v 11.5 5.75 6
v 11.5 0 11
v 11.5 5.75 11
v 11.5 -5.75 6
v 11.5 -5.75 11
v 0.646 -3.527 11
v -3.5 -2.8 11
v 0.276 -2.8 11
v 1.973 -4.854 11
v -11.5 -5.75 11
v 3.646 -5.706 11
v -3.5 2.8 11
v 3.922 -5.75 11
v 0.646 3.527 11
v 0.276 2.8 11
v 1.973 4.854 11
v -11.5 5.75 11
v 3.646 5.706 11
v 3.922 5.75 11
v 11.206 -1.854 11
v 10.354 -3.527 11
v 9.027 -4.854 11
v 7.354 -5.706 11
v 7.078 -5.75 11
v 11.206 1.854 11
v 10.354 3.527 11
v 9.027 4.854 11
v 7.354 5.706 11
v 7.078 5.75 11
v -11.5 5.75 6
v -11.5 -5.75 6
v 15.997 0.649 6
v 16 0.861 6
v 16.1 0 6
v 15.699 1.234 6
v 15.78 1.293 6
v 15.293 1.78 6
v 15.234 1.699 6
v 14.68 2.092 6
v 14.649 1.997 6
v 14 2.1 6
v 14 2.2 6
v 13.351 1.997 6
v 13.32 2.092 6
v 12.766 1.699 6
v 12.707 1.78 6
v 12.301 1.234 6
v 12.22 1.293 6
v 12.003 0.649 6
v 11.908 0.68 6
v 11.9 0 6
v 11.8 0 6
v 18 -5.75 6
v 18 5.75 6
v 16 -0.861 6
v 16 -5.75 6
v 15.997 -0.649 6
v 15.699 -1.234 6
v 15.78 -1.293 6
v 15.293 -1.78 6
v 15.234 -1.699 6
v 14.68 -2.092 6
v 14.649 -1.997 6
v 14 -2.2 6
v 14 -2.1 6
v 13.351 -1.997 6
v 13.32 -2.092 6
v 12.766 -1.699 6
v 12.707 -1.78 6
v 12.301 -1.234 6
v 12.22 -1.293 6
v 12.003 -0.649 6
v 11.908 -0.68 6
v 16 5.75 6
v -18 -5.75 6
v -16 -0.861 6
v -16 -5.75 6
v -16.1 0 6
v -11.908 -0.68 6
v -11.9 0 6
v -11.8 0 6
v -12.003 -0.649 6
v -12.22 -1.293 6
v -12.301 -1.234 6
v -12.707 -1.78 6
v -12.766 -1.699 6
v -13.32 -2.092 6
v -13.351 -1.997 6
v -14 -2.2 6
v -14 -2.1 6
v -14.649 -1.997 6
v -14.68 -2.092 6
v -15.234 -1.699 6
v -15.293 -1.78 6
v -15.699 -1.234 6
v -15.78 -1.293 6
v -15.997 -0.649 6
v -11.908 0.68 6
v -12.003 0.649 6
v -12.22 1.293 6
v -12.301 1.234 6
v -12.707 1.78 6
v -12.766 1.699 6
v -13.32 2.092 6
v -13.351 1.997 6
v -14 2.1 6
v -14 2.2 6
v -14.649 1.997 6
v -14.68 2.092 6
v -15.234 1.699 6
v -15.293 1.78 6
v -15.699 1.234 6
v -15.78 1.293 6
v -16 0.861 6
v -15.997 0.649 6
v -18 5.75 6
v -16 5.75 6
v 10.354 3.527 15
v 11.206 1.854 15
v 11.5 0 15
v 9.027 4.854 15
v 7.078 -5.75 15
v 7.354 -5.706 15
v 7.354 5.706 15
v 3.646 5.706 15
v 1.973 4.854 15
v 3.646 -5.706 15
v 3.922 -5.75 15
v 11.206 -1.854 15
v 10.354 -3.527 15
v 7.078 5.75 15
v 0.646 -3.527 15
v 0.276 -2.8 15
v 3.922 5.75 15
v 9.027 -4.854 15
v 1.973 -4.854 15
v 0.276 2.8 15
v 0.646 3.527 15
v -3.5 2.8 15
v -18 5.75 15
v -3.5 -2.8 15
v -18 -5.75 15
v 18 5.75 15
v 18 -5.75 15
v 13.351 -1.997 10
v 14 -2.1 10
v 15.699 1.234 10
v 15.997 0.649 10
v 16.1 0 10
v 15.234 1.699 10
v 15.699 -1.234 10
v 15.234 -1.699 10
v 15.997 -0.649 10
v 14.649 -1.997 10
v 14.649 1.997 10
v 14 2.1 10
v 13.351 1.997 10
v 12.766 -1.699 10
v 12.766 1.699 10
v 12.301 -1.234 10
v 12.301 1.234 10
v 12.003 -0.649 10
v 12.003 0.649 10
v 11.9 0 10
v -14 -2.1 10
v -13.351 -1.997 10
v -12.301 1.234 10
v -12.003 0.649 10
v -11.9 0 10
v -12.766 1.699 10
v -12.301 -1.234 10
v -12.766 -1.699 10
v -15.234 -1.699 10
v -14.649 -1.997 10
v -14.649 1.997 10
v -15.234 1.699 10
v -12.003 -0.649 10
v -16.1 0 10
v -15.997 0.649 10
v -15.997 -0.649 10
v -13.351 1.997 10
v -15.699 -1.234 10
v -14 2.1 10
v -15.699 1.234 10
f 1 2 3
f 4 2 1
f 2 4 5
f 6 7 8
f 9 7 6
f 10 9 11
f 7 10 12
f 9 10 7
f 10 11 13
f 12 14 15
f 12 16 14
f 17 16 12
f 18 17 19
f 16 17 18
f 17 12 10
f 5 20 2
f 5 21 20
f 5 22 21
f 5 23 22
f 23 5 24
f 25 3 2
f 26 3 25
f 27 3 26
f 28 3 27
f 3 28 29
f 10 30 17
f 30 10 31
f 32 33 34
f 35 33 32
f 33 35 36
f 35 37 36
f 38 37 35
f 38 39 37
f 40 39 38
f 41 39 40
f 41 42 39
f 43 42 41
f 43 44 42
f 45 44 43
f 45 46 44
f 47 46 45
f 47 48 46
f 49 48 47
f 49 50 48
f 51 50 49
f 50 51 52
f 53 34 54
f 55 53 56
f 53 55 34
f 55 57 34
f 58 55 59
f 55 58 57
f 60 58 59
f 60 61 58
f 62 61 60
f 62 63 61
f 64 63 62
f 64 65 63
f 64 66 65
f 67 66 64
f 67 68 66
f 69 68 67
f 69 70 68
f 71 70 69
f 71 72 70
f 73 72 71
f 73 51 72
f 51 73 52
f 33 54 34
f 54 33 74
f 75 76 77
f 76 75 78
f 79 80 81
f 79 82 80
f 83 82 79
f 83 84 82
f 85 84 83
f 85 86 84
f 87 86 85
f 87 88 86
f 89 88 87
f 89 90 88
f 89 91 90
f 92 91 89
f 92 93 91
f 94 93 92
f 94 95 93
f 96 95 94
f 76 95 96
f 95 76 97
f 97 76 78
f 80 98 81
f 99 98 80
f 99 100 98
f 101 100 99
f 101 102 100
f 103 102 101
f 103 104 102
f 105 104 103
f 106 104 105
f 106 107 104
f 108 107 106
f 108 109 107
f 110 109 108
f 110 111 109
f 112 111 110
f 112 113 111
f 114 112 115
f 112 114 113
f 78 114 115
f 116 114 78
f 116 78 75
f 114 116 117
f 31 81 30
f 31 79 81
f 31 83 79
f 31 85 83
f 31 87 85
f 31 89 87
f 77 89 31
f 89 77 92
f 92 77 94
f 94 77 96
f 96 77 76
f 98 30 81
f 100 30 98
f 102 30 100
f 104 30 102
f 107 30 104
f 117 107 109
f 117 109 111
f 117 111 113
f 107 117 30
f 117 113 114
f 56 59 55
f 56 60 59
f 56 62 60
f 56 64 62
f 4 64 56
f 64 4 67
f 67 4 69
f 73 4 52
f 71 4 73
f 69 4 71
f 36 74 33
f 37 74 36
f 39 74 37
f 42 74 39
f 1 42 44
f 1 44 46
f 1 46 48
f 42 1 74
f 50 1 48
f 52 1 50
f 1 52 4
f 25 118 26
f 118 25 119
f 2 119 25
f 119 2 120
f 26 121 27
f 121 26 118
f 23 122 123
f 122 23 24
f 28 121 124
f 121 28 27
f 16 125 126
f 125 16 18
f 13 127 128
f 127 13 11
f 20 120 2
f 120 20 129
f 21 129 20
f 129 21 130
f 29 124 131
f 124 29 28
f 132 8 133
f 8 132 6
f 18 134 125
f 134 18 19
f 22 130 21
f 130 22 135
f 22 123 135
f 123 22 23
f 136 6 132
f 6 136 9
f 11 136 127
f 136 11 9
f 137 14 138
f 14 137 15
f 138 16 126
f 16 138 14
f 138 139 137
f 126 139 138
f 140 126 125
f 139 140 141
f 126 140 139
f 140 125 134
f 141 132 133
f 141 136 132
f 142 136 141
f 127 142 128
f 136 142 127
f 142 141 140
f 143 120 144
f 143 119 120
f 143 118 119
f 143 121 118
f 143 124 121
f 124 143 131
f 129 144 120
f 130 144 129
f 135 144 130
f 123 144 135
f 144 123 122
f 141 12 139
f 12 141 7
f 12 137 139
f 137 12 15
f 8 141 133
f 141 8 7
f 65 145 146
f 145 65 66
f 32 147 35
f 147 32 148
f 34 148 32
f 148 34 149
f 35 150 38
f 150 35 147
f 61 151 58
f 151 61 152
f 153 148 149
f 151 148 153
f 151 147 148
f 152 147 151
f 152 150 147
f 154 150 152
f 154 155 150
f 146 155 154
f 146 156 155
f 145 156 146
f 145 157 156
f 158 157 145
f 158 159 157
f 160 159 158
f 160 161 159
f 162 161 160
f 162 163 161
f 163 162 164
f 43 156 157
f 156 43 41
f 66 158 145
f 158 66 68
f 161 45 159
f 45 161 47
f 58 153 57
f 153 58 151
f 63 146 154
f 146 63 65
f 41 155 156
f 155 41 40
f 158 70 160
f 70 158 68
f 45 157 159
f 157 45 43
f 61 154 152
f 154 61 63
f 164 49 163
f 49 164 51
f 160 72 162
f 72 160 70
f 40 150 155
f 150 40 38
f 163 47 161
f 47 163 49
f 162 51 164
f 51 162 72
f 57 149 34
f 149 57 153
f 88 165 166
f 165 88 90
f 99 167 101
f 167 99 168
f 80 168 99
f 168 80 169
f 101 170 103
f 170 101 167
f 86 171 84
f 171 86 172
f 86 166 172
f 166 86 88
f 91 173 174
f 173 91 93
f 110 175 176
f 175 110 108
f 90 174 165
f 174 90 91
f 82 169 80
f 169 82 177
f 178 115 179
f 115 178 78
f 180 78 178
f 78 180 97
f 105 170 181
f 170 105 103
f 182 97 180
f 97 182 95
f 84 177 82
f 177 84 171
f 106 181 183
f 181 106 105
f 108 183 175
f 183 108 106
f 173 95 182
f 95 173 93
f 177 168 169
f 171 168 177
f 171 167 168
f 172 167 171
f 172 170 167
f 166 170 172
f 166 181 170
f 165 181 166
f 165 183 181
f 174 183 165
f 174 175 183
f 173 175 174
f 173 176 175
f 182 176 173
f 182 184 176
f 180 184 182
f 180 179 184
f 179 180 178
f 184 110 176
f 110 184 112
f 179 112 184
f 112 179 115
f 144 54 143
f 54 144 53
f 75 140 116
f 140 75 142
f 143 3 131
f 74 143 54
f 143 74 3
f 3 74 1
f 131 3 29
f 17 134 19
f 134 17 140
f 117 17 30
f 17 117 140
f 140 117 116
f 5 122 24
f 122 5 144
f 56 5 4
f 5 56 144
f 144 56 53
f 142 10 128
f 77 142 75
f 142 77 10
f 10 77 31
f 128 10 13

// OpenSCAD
// file: 9g_servo.scad
//9g_motor();

module 9g_motor(){
	difference(){			
		union(){
			color("blue") cube([23,12.5,22], center=true);
			color("blue") translate([0,0,5]) cube([32,12,2], center=true);
			color("blue") translate([5.5,0,2.75]) cylinder(r=6, h=25.75, $fn=20, center=true);
			color("blue") translate([-.5,0,2.75]) cylinder(r=1, h=25.75, $fn=20, center=true);
			color("blue") translate([-1,0,2.75]) cube([5,5.6,24.5], center=true);		
			color("white") translate([5.5,0,3.65]) cylinder(r=2.35, h=29.25, $fn=20, center=true);				
		}
		translate([10,0,-11]) rotate([0,-30,0]) cube([8,13,4], center=true);
		for ( hole = [14,-14] ){
			translate([hole,0,5]) cylinder(r=2.2, h=4, $fn=20, center=true);
		}	
	}
}
// main file
include <9g_servo.scad>;
difference()
{
translate([0,0,16])
cube([32+4,11.5,20], center=true);
9g_motor();
    
for ( hole = [14,-14] ){
			translate([hole,0,5]) cylinder(r=2.1, h=10, $fn=20, center=true);
		}	
        
        translate([0,0,25])
        cube([32+4+1,11.5+1,20], center=true);

}
